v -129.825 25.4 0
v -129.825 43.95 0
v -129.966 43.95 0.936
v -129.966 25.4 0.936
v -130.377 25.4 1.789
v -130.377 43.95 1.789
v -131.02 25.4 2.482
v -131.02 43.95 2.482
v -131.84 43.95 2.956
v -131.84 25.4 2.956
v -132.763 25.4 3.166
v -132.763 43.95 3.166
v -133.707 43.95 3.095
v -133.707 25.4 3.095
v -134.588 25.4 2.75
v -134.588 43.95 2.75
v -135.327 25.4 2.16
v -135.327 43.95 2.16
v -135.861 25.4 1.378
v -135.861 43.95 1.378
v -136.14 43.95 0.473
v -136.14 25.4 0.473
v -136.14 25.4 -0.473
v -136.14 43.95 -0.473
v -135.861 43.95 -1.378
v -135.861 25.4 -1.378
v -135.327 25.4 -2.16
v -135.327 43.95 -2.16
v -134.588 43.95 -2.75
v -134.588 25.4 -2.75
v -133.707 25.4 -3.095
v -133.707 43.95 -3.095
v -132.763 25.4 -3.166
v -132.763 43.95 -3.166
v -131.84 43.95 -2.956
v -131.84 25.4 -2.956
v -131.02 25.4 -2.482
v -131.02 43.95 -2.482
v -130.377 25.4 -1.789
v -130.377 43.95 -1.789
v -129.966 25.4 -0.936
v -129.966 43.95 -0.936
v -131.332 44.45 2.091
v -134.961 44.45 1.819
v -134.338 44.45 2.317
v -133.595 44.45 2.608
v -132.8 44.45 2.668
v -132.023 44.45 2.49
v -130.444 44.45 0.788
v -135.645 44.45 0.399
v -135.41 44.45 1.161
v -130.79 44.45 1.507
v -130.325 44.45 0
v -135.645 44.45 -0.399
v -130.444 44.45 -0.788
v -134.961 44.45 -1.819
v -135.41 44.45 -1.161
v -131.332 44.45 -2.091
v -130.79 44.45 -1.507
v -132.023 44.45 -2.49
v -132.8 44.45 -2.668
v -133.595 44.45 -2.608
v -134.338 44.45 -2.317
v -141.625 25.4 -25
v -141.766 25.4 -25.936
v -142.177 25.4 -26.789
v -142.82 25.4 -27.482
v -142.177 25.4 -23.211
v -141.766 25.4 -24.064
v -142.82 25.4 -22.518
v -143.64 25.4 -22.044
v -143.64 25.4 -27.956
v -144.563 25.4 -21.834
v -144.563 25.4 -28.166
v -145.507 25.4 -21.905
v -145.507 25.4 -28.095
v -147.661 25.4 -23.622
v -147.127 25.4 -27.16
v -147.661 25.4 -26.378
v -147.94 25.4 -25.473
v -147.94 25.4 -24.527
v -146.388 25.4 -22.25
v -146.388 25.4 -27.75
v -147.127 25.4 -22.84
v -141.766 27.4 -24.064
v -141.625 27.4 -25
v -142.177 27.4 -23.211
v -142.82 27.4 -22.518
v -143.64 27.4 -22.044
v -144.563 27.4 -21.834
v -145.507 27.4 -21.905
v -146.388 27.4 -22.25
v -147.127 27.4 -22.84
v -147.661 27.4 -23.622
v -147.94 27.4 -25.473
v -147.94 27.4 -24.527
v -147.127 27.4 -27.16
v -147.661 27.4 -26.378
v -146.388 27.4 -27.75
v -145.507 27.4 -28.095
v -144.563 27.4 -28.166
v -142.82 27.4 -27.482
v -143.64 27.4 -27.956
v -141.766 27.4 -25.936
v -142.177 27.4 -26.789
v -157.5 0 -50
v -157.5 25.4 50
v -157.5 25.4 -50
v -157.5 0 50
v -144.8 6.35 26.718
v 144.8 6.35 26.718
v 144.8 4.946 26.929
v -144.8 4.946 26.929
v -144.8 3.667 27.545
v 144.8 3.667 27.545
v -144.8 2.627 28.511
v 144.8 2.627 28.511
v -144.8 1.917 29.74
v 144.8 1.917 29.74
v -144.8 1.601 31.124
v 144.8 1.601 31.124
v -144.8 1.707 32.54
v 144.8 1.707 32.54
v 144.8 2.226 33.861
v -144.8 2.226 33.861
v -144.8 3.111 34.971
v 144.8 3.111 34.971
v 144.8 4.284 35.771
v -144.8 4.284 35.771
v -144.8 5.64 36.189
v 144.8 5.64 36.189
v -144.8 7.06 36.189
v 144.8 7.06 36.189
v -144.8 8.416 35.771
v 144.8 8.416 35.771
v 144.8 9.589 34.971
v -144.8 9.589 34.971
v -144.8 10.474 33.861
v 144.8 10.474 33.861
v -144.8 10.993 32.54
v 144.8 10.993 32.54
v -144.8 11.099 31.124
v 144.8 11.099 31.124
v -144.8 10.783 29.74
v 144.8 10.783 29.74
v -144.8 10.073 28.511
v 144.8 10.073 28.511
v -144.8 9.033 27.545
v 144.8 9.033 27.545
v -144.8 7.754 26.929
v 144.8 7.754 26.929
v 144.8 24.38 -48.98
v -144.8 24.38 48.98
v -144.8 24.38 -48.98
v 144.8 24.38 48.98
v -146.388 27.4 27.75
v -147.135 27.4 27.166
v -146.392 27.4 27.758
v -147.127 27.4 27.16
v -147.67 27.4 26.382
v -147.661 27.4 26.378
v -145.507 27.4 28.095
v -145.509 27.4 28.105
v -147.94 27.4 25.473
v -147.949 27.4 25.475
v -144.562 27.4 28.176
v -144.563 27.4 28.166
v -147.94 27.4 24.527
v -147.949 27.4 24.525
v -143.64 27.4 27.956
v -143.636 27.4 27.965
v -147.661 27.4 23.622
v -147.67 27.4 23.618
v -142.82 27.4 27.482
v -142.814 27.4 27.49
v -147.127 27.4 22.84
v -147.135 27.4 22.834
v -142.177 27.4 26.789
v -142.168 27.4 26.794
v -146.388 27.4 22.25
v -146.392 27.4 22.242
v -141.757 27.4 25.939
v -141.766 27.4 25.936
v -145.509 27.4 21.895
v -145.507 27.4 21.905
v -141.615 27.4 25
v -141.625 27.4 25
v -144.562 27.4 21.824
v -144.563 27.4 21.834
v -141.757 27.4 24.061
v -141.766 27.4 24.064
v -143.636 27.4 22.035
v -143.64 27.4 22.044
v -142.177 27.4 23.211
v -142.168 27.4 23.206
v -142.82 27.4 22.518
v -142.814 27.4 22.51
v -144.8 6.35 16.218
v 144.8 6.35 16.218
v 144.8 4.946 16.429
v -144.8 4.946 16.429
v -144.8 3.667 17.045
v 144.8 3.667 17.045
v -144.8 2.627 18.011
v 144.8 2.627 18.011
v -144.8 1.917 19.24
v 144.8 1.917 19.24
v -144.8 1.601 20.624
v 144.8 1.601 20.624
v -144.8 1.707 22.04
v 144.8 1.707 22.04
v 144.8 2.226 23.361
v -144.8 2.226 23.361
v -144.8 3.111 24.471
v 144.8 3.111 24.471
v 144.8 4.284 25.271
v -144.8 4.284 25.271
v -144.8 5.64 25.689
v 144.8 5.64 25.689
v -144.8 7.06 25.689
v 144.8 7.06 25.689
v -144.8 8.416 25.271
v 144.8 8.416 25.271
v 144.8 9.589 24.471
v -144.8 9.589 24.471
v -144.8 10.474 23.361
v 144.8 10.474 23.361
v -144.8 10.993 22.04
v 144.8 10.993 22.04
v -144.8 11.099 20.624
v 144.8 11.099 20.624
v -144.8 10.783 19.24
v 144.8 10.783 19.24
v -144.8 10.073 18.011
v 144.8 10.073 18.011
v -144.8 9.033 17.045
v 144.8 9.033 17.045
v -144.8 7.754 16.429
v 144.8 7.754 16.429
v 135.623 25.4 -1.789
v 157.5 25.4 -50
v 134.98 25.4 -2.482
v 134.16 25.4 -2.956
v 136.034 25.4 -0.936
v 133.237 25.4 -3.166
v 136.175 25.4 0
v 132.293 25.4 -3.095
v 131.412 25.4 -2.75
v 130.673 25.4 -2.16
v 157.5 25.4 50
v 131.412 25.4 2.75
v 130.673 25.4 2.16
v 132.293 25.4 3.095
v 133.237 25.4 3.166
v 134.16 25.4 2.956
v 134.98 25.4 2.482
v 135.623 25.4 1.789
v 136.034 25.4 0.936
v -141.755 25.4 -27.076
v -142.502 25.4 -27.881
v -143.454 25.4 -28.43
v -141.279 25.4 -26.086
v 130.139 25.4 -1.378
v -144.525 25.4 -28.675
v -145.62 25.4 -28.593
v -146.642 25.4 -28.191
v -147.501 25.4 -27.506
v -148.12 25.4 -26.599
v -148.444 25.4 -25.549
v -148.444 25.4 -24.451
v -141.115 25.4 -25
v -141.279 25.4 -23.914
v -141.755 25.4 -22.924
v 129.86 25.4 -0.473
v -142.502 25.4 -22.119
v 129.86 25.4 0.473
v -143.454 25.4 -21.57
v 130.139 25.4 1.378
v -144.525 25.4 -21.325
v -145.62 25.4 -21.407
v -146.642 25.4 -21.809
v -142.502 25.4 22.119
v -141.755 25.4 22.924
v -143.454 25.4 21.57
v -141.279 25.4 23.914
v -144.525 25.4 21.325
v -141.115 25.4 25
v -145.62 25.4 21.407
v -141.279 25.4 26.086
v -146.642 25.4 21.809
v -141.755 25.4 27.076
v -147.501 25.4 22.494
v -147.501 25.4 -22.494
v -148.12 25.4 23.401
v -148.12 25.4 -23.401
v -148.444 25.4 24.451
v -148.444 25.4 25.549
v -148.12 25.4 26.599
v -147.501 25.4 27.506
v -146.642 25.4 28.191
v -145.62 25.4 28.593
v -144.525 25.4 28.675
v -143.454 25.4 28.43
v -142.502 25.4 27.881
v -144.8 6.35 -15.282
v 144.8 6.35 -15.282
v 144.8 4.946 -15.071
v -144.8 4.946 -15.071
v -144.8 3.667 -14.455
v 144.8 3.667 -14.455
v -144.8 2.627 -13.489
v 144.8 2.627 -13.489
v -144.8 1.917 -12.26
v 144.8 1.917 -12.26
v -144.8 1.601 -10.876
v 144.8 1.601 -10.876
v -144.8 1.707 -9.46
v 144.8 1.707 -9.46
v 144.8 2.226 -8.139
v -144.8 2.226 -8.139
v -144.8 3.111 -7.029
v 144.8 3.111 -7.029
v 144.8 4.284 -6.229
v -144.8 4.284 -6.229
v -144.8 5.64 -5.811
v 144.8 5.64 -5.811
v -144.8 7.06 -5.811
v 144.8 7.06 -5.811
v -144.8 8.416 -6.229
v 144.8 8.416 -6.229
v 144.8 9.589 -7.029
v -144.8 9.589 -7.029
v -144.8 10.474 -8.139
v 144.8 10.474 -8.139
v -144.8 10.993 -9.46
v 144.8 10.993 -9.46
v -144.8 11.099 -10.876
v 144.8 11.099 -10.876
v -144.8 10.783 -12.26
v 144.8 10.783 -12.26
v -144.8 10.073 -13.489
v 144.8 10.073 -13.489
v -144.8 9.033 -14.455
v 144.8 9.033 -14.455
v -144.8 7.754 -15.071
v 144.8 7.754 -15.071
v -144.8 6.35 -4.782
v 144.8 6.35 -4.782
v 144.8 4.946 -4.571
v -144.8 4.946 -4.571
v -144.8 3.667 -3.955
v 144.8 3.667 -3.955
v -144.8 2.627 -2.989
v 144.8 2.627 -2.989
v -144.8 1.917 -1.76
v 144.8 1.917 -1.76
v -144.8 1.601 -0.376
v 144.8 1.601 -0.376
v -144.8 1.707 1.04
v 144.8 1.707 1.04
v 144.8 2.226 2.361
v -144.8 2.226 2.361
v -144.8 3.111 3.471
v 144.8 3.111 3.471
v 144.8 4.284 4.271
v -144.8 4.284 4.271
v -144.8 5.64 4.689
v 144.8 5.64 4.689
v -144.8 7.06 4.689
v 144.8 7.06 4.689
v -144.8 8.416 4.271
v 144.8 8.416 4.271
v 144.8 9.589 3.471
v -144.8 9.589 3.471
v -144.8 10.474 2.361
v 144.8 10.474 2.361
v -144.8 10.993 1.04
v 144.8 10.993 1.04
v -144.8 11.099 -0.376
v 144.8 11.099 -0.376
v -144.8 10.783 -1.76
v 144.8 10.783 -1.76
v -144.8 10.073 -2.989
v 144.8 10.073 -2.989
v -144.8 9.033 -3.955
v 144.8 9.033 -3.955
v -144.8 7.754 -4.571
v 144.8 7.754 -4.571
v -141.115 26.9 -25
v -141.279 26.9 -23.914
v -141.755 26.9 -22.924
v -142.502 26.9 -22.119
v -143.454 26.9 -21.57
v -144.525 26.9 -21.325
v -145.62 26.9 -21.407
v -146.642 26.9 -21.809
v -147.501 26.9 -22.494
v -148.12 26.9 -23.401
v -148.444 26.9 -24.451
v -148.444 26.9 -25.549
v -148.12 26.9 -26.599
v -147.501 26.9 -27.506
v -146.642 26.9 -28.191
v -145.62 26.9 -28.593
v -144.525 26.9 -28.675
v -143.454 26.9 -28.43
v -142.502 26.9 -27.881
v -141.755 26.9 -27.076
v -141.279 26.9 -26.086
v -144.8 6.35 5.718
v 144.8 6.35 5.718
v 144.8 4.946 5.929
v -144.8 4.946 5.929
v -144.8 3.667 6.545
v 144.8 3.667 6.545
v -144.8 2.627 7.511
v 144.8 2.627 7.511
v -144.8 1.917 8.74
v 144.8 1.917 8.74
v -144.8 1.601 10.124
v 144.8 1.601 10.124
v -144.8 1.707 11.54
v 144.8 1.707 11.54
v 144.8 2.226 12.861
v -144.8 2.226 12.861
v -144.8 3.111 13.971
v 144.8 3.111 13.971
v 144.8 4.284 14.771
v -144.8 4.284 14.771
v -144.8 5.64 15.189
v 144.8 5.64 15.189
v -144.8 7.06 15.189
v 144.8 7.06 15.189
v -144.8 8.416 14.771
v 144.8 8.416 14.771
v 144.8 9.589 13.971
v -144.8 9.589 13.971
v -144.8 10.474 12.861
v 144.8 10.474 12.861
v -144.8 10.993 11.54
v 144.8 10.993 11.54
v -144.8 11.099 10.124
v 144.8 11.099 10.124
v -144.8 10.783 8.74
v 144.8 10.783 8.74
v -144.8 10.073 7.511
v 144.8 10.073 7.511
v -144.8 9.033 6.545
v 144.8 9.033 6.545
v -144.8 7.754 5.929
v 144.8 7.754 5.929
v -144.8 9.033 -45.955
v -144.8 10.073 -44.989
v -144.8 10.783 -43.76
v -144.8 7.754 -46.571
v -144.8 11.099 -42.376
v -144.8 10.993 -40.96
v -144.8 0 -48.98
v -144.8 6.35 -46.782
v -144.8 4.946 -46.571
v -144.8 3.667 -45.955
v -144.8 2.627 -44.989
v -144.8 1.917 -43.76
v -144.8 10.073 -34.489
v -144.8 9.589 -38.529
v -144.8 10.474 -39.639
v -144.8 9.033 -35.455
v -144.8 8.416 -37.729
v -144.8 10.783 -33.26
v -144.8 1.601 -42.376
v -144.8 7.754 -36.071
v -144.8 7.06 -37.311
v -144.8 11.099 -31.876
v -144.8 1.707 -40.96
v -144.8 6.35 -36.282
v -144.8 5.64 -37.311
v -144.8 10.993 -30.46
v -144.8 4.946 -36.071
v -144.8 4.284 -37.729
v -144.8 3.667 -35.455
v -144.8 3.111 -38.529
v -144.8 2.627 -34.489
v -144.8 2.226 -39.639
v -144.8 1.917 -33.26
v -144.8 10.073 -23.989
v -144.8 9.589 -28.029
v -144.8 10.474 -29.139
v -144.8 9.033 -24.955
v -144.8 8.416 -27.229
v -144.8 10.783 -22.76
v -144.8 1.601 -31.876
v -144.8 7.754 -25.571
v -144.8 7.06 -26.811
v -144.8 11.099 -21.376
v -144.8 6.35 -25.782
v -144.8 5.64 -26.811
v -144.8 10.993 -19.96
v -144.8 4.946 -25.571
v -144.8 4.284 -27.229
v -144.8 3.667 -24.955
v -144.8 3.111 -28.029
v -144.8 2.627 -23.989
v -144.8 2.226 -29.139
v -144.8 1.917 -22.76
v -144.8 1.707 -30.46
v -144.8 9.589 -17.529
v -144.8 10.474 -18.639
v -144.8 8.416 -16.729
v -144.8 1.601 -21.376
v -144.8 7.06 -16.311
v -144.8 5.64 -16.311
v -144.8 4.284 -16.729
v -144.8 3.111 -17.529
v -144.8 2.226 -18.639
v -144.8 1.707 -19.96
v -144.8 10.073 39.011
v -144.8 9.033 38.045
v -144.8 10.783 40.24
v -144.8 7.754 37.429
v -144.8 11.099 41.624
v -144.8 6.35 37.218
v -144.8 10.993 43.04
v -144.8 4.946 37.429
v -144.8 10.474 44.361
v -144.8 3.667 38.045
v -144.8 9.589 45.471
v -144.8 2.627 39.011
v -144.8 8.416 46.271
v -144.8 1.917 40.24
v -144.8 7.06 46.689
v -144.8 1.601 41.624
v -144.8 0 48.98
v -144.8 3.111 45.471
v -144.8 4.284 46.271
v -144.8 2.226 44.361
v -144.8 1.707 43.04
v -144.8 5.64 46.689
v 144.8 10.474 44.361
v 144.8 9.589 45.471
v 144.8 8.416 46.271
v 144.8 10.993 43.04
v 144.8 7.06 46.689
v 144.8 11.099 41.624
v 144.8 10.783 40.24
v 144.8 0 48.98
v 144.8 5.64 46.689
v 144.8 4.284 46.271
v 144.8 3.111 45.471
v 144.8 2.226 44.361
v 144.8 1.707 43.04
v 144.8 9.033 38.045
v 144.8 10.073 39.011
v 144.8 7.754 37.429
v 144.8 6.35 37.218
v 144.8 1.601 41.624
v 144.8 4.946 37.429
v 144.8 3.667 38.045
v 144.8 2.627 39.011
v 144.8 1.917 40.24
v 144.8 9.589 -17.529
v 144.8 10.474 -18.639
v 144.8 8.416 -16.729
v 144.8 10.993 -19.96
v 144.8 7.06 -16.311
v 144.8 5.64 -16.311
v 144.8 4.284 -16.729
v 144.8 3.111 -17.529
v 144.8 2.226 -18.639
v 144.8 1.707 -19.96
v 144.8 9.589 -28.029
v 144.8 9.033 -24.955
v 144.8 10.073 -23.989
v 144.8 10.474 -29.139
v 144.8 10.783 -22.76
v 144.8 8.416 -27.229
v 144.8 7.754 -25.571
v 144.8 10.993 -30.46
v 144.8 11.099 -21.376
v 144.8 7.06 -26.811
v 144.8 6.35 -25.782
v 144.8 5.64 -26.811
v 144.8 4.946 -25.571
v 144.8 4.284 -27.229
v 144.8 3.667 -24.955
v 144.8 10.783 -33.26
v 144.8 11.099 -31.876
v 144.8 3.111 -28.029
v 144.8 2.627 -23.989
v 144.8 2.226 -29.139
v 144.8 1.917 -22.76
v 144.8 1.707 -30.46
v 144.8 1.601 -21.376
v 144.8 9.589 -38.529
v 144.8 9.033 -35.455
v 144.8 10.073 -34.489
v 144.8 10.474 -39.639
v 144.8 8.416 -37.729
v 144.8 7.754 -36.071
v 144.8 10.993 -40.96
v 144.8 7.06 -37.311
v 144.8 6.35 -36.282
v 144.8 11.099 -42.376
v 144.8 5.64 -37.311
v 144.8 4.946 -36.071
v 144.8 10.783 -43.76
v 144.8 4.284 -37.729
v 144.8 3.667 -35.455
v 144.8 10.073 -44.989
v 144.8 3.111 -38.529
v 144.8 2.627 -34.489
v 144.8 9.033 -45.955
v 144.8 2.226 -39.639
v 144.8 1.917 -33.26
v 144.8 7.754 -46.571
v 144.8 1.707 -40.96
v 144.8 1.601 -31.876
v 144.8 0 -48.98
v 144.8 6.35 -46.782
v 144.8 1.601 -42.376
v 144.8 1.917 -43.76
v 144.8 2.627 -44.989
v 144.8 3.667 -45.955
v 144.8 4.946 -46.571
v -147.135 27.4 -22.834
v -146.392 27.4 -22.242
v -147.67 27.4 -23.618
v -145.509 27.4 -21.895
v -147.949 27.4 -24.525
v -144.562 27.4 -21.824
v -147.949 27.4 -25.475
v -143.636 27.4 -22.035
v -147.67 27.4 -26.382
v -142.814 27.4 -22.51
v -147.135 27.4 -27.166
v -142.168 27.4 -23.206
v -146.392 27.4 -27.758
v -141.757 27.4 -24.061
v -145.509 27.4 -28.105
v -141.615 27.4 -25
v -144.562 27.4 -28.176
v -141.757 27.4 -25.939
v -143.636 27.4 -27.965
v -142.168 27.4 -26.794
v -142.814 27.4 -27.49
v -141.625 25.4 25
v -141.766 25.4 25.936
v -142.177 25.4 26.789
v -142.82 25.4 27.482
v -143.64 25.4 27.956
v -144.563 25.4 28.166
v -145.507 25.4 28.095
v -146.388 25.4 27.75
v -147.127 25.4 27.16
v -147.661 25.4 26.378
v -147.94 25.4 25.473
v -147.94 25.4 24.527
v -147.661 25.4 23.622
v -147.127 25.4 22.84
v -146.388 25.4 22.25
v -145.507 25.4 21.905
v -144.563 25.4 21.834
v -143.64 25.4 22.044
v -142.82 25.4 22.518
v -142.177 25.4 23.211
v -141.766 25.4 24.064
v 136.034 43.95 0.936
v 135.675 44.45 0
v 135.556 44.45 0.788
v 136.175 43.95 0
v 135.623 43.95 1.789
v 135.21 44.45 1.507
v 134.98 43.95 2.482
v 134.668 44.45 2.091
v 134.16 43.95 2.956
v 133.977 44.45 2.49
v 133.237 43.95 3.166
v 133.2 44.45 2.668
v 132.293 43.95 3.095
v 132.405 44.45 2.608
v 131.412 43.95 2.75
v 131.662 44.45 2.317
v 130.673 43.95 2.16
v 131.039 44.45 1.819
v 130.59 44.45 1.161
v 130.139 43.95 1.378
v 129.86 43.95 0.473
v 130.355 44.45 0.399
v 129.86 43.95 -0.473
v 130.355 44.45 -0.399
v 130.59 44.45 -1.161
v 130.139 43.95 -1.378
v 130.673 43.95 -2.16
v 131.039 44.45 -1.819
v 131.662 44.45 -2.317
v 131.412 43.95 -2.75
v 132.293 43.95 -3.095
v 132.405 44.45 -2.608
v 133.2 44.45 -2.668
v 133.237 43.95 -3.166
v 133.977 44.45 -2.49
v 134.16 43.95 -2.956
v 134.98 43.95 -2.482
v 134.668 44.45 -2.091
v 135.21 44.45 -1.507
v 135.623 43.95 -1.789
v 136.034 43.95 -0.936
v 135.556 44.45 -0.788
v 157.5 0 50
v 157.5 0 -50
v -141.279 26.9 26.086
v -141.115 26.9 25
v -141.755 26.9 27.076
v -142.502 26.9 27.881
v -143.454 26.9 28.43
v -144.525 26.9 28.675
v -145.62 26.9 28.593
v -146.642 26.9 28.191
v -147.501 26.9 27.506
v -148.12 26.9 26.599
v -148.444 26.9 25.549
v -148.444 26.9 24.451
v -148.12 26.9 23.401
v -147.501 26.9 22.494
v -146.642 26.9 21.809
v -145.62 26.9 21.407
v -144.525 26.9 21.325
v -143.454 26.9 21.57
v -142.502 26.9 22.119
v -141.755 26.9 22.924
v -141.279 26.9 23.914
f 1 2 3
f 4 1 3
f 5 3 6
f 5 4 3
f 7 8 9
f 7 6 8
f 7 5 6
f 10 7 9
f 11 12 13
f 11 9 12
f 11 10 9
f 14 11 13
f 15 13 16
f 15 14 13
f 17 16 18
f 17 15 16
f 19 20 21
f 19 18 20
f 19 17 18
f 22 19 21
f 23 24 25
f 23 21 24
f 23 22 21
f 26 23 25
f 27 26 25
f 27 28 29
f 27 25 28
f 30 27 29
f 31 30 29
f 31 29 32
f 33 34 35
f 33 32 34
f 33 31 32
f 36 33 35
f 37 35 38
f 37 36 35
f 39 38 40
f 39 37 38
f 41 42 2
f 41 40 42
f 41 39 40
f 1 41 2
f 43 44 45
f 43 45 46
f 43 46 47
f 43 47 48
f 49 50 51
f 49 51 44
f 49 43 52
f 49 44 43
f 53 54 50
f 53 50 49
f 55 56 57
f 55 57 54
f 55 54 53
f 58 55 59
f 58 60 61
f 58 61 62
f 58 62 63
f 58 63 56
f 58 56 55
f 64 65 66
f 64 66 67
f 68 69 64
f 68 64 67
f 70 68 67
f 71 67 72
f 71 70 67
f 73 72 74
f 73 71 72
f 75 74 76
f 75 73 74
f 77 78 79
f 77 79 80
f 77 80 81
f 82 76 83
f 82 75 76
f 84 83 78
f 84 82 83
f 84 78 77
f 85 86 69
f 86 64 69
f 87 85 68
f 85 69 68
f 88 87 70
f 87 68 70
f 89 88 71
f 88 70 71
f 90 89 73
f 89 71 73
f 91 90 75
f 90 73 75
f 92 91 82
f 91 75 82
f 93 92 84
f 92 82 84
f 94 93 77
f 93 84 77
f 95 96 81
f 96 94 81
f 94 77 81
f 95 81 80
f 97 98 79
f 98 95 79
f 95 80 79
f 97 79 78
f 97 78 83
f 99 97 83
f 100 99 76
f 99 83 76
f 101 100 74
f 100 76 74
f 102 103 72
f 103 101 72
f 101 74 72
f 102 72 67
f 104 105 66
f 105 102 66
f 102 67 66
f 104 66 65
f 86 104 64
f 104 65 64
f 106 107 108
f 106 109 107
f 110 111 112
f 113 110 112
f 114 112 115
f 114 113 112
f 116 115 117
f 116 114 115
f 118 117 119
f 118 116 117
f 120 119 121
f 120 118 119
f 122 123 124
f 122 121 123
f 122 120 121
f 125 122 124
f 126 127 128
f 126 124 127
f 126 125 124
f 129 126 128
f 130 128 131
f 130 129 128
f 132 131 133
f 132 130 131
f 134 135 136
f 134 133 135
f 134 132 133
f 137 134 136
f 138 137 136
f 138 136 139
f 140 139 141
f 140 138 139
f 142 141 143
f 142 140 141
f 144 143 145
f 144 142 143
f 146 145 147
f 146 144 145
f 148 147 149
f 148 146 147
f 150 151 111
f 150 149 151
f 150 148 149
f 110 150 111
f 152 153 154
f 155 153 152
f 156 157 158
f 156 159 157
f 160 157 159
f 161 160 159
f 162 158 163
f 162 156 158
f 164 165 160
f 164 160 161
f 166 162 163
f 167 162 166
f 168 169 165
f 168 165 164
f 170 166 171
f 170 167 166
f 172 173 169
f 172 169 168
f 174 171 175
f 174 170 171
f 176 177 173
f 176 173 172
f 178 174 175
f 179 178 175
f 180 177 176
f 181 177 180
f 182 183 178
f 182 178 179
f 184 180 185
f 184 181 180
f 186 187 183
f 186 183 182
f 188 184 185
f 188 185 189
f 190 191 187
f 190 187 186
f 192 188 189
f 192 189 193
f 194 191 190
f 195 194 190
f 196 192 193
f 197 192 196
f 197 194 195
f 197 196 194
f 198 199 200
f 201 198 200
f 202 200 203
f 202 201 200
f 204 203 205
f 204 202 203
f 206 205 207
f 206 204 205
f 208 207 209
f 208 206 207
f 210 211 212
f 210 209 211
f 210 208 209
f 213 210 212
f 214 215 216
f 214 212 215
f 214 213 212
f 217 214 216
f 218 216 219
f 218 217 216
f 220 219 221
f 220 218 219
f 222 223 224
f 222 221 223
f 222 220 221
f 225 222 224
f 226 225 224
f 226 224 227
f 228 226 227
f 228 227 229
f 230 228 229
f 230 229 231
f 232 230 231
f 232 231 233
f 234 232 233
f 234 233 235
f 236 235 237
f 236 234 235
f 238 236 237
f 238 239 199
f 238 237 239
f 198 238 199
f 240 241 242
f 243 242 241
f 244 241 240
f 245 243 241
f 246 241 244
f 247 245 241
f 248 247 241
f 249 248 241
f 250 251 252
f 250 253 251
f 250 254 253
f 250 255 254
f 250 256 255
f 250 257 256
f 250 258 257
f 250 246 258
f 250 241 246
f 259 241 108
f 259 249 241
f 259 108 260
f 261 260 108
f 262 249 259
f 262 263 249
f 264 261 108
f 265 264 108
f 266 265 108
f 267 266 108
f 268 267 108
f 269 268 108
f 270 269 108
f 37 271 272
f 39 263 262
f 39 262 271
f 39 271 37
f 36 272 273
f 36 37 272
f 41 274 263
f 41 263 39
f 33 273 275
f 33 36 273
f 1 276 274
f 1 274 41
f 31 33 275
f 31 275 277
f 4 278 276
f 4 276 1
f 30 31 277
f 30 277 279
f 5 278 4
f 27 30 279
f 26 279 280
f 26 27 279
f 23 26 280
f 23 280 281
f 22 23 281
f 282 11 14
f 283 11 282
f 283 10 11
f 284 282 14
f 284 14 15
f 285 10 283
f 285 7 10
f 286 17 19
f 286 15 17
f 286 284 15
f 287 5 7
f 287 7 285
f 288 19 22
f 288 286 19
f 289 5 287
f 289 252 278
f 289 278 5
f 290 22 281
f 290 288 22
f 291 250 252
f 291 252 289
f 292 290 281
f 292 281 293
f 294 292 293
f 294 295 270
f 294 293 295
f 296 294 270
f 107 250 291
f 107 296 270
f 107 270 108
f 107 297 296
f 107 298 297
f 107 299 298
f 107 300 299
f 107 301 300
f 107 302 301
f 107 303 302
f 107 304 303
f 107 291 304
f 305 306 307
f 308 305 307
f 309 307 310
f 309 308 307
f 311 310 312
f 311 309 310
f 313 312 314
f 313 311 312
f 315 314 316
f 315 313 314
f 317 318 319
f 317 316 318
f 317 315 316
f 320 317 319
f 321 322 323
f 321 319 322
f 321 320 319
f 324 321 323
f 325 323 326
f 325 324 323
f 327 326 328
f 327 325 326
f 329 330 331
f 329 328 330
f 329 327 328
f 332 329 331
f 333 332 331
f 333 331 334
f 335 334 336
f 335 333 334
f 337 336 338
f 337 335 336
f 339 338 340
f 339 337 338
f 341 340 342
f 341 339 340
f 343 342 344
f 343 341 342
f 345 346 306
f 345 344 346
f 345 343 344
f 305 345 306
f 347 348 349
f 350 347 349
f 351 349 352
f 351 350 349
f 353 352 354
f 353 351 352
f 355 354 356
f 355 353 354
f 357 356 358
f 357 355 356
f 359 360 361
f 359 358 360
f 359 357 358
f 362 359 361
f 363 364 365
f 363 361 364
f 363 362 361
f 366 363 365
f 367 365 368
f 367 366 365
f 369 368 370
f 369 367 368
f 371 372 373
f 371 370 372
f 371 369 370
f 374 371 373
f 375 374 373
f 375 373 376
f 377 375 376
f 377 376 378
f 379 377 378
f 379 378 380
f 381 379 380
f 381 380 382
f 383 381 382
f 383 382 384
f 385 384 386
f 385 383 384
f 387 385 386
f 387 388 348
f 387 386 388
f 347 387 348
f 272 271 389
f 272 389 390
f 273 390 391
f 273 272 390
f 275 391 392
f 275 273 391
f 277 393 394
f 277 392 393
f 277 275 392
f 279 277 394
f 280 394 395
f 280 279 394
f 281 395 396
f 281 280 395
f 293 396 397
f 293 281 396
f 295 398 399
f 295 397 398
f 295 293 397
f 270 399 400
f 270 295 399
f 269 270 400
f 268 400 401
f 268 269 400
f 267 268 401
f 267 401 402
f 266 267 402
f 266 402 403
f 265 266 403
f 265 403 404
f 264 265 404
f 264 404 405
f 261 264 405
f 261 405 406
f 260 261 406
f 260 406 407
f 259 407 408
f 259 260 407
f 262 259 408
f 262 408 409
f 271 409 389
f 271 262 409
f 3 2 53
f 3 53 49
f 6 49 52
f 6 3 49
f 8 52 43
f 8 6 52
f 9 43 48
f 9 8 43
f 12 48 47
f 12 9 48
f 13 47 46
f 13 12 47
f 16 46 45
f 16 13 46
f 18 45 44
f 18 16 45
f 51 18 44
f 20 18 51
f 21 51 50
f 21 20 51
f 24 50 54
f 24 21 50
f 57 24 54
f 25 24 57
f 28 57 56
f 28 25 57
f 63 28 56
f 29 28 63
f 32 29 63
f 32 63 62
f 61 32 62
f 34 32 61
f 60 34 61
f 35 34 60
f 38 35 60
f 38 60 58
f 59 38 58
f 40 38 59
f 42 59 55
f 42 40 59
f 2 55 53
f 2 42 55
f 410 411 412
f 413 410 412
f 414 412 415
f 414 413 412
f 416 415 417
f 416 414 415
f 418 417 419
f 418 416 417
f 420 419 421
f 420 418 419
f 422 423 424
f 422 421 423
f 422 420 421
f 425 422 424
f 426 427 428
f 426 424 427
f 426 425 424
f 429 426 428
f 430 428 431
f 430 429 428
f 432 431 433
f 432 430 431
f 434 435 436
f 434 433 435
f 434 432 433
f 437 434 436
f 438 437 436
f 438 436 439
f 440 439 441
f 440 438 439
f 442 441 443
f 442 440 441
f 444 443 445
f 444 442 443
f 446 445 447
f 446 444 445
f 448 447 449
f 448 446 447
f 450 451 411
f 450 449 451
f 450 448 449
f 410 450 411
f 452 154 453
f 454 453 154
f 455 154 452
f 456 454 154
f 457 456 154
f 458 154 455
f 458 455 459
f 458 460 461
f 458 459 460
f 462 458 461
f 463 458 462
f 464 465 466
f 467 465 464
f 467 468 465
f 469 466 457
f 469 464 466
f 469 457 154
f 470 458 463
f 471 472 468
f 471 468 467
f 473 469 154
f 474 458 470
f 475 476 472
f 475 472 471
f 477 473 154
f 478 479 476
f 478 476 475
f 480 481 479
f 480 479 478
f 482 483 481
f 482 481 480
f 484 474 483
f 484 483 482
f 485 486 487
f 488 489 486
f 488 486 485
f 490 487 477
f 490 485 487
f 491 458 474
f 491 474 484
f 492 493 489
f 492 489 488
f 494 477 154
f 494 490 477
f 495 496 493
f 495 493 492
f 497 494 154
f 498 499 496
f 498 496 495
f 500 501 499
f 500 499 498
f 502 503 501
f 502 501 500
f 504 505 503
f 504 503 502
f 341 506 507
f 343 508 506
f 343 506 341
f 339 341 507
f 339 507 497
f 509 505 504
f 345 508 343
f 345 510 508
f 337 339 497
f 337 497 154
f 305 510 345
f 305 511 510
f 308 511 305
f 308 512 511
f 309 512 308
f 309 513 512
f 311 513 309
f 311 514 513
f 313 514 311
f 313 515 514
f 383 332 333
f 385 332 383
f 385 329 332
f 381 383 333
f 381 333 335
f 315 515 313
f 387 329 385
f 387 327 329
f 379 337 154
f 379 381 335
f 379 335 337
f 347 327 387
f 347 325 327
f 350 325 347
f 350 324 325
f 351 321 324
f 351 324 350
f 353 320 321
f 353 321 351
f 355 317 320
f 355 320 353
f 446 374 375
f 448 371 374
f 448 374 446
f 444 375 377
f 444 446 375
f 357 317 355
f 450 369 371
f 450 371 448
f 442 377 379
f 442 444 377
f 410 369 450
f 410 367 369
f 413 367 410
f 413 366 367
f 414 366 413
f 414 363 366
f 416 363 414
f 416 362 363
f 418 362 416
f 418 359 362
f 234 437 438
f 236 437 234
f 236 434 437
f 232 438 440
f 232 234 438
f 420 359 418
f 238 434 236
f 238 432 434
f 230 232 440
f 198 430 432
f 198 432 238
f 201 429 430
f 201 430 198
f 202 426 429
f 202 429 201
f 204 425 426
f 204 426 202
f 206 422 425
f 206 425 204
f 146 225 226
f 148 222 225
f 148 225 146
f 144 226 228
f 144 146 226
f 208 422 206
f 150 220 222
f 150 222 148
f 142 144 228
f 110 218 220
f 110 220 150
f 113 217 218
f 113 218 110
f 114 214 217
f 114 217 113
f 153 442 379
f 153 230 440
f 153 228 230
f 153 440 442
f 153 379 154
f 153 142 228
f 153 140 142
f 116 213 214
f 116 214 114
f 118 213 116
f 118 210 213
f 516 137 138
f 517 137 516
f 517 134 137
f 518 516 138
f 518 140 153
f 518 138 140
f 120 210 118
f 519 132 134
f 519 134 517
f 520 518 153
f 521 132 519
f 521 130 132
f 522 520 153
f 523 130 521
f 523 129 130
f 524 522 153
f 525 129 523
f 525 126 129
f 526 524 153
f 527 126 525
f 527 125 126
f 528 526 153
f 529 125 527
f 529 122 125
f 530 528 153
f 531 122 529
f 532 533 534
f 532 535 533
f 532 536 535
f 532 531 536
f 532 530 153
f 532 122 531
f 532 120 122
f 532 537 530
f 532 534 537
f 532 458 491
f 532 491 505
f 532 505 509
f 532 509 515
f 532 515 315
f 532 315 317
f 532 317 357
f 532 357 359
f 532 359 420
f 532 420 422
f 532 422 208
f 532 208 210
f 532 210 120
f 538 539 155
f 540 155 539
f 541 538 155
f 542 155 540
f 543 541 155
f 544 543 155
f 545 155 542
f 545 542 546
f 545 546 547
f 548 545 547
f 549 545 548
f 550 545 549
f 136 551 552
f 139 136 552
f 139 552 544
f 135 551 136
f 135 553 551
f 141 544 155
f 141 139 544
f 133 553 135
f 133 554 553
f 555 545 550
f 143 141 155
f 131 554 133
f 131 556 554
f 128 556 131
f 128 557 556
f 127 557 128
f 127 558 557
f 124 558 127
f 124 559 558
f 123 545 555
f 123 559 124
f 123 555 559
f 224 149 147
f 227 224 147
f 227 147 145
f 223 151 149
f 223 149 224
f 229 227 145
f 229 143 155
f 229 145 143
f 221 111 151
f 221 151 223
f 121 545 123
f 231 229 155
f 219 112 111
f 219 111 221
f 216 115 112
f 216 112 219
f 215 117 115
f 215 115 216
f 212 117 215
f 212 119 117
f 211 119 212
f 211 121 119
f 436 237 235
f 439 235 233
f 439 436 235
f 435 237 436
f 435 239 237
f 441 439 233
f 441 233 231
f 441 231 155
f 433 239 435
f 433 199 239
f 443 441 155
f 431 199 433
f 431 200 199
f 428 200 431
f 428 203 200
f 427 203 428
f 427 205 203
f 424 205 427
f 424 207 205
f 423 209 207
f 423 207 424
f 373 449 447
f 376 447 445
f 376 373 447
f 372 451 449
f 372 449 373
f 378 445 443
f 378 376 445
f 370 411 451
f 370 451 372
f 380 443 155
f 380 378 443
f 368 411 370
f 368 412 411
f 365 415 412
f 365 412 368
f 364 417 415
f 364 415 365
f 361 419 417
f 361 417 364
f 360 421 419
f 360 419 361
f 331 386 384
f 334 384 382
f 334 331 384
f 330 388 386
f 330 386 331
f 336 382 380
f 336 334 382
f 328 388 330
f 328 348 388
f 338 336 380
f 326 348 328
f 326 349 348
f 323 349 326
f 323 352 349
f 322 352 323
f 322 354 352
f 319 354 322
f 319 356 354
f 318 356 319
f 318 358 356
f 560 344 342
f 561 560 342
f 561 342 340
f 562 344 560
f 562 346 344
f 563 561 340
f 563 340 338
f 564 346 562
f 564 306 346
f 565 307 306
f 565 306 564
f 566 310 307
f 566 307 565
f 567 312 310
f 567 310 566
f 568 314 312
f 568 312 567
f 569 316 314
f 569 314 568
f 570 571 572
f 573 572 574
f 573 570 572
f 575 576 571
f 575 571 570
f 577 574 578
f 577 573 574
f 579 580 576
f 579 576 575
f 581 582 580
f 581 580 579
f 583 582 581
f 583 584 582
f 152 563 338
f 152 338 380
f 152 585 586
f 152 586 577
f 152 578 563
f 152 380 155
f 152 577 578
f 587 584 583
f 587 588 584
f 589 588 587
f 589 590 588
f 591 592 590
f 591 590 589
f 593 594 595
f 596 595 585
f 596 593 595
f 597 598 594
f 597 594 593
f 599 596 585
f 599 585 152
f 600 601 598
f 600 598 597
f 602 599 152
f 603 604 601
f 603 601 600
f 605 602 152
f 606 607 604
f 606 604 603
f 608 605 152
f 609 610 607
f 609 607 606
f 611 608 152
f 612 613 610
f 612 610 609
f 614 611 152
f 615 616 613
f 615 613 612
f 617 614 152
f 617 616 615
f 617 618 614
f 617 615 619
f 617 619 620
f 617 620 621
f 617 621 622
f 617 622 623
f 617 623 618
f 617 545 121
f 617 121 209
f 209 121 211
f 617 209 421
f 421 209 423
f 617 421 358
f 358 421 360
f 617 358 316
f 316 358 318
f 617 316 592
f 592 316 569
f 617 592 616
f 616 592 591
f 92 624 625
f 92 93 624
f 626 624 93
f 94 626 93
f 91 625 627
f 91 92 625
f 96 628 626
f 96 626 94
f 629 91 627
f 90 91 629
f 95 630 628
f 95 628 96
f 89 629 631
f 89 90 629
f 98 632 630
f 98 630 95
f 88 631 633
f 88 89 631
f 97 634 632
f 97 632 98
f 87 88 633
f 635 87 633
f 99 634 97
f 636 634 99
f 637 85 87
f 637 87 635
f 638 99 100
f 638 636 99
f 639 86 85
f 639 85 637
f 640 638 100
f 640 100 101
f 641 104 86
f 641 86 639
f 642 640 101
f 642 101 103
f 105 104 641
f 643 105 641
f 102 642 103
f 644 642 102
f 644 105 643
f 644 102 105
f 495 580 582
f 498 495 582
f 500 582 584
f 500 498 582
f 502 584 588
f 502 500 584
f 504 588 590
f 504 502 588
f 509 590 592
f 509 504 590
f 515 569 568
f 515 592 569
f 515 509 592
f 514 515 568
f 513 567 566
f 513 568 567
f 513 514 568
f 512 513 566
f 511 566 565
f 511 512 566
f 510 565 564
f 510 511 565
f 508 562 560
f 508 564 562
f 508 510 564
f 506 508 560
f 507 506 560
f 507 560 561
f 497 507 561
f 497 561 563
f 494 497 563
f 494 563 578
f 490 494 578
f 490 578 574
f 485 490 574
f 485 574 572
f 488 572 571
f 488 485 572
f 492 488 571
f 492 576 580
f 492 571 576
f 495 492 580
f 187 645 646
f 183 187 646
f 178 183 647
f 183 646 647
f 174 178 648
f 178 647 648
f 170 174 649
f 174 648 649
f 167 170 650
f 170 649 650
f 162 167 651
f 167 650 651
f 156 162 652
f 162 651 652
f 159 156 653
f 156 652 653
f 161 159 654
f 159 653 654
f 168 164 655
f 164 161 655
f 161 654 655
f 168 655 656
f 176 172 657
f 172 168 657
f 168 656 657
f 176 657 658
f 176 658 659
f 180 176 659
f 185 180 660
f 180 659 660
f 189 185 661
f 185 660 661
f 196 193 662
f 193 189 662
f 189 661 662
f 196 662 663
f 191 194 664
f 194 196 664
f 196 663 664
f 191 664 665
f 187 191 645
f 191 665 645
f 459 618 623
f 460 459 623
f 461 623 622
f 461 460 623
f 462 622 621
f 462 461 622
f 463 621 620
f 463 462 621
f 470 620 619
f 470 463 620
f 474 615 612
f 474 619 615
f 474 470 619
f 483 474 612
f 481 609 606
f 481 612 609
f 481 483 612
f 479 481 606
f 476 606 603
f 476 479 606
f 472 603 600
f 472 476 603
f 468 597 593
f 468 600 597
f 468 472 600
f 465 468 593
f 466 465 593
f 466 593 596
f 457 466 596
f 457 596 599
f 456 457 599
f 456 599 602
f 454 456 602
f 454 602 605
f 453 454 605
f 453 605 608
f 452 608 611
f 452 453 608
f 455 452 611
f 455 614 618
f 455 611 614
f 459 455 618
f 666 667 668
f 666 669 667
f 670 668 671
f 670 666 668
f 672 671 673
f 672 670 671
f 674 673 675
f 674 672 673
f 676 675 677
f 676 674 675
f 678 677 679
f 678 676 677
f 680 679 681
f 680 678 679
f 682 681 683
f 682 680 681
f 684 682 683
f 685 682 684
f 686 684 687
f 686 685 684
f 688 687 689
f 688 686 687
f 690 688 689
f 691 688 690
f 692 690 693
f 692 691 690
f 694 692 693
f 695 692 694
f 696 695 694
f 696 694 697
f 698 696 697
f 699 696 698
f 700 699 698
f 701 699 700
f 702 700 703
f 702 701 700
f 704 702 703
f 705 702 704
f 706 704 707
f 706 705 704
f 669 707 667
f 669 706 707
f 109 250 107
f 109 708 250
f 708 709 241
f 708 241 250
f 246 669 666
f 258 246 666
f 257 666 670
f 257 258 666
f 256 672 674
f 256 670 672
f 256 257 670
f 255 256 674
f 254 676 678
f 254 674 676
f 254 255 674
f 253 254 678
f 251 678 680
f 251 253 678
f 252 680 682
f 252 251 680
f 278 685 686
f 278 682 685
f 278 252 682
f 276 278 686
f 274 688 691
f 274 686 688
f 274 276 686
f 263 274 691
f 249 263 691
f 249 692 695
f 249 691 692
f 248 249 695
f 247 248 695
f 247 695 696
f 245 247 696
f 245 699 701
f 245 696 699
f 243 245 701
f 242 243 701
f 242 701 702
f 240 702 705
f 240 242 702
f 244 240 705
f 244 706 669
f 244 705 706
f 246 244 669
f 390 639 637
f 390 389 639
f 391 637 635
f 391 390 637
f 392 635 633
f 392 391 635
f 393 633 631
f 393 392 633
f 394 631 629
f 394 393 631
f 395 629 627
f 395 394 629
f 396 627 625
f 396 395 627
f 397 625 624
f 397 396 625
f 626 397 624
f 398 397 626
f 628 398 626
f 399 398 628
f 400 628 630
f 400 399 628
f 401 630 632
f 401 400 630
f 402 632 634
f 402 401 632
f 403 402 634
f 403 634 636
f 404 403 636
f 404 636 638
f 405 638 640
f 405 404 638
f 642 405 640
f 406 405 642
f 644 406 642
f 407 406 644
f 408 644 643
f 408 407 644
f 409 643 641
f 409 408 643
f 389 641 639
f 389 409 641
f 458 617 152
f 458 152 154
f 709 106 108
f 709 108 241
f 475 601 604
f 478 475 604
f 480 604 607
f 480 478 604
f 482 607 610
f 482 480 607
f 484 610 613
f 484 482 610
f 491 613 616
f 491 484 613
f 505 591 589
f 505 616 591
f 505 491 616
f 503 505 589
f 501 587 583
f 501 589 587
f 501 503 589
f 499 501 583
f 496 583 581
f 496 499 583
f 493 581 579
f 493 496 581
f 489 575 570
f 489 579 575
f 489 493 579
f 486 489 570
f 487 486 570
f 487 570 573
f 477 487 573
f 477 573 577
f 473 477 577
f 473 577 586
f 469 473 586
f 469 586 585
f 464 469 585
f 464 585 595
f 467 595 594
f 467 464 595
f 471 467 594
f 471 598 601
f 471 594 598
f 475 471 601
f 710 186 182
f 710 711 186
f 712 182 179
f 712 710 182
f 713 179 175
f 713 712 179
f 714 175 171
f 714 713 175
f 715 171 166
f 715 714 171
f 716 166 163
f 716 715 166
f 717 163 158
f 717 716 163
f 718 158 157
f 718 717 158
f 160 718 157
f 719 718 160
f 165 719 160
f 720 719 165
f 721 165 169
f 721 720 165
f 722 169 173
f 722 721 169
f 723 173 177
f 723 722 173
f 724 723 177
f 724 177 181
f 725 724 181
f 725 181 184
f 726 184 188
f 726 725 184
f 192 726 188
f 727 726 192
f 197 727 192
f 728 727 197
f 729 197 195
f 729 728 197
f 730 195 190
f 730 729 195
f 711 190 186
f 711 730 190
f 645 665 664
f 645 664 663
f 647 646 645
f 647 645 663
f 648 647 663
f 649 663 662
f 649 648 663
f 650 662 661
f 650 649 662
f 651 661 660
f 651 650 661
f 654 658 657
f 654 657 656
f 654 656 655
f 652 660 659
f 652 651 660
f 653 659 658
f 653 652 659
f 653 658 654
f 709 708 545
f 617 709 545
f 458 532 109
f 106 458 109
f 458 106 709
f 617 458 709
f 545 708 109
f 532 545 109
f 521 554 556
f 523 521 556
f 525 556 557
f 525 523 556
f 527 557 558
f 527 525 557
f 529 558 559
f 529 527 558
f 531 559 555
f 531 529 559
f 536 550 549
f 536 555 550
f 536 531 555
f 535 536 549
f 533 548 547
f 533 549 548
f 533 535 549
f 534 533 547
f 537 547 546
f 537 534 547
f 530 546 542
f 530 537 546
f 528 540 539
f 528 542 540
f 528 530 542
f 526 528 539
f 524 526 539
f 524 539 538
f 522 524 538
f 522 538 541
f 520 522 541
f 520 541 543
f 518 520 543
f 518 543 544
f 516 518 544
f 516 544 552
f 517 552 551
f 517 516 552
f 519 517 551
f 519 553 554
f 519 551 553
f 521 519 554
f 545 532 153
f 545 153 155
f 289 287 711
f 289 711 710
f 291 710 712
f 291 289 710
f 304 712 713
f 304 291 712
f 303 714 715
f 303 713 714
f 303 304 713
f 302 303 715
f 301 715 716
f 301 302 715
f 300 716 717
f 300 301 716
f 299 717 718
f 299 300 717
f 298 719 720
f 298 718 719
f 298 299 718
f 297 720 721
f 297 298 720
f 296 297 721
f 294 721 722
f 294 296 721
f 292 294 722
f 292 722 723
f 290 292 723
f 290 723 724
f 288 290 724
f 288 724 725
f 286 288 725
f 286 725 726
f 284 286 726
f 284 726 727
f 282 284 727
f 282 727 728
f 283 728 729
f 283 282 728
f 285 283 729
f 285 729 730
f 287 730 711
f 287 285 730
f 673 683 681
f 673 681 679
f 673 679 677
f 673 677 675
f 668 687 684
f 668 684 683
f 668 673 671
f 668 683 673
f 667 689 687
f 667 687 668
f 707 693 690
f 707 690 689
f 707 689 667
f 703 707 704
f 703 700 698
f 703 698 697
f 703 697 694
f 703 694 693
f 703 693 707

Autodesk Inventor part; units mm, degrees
ref_plane "YZ Plane" through (0, 0, 0) normal (1, 0, 0) x (0, 1, 0)
ref_plane "XZ Plane" through (0, 0, 0) normal (0, 1, 0) x (-1, 0, 0)
ref_plane "XY Plane" through (0, 0, 0) normal (0, 0, 1) x (1, 0, 0)
sketch "Boceto1" plane through (0, 0, 0) normal (0, 1, 0) x (-1, 0, 0)
  line L0 (-157.5, 50) -> (157.5, 50)
  line L1 (157.5, 50) -> (157.5, -50)
  line L2 (157.5, -50) -> (-157.5, -50)
  line L3 (-157.5, -50) -> (-157.5, 50)
  line L4 (-157.5, 50) -> (157.5, -50) construction
  line L5 (157.5, 50) -> (-157.5, -50) construction
  point P0 (0, 0)
  dimension "d0" = 315
  dimension "d1" = 100
extrude "Extrusión1" add sketch "Boceto1" along normal blind 25.4
sketch "Boceto2" plane through (0, 0, 0) normal (0, -1, 0) x (1, 0, 0)
  line L0 (-144.8, 48.98) -> (144.8, 48.98)
  line L1 (144.8, -48.98) -> (-144.8, -48.98)
  line L2 (-144.8, -48.98) -> (-144.8, 48.98)
  line L3 (144.8, 48.98) -> (144.8, -48.98)
  line L4 (-157.5, -50) -> (-157.5, 50) projected
  line L5 (-157.5, 50) -> (157.5, 50) projected
  line L6 (157.5, 50) -> (157.5, -50) projected
  dimension "d8" = 12.7
  dimension "d9" = 1.02
  dimension "d52" = 12.7
extrude "Extrusión2" cut sketch "Boceto2" against normal blind 24.38
sketch "Boceto4" plane through (0, 25.4, 0) normal (0, 1, 0) x (1, 0, 0)
  line L0 (-157.5, 50) -> (-108.5, 50) construction
  line L1 (-108.5, 50) -> (-108.5, -50) construction
  line L2 (-157.5, -50) -> (157.5, -50) construction
  line L3 (-157.5, -50) -> (-108.5, 50) construction
  line L4 (-157.5, 50) -> (-108.5, -50) construction
  line L5 (157.5, 50) -> (-157.5, 50) construction
  line L6 (157.5, 50) -> (108.5, 50) construction
  line L7 (108.5, 50) -> (108.5, -50) construction
  line L8 (108.5, -50) -> (157.5, 50) construction
  line L9 (108.5, 50) -> (157.5, -50) construction
  circle A0 centre (-133, 0) radius 3.175
  circle A1 centre (133, 0) radius 3.175
  point P0 (0, 0)
  dimension "d24" = 49
  dimension "d25" = 49
  dimension "d26" = 6.35
  dimension "d27" = 6.35
extrude "Extrusión4" add sketch "Boceto4" along normal blind 19.05
thread "Rosca1" size "1/4-20 UNC" class "1A" standard "ANSI Unified Screw Threads" full length
thread "Rosca2" size "M7x1" class "6g" standard "ANSI Metric M Profile" full length
chamfer "Chaflán1" distance 0.5 angle 45 1 edges at (-136.175, 44.45, 0)
chamfer "Chaflán2" distance 0.5 angle 45 1 edges at (129.825, 44.45, 0)
sketch "Boceto6" plane through (-144.8, 0, 48.98) normal (1, 0, 0) x (0, 0, -1)
  circle A0 centre (7, 6.35) radius 4.7625
  line L0 (0, 0) -> (0, 24.38) projected
  line L1 (97.96, 0) -> (0, 0) projected
  circle A1 centre (17.5, 6.35) radius 4.7625
  circle A2 centre (28, 6.35) radius 4.7625
  circle A3 centre (38.5, 6.35) radius 4.7625
  circle A4 centre (49, 6.35) radius 4.7625
  circle A5 centre (59.5, 6.35) radius 4.7625
  circle A6 centre (70, 6.35) radius 4.7625
  circle A7 centre (80.5, 6.35) radius 4.7625
  circle A8 centre (91, 6.35) radius 4.7625
  point P0 (48.98, 0)
  dimension "d53" = 9.525
  dimension "d54" = 7
  dimension "d55" = 6.35
  dimension "d58" = 10.5
extrude "Extrusión6" add sketch "Boceto6" along normal up to surface (289.6 mm away)
sketch "Boceto7" plane through (0, 25.4, 0) normal (0, 1, 0) x (1, 0, 0)
  line L0 (-157.5, 50) -> (-157.5, -50) construction
  line L1 (-157.5, 0) -> (-144.8, 0) construction
  line L2 (-144.8, 0) -> (-144.8, 25) construction
  line L3 (-144.8, 48.98) -> (-144.8, -48.98) construction
  line L4 (-144.8, 0) -> (-144.8, -25) construction
  circle A0 centre (-144.8, -25) radius 3.175
  circle A1 centre (-144.8, 25) radius 3.175
  circle A2 centre (-144.8, -25) radius 3.685
  circle A3 centre (-144.8, 25) radius 3.685
  point P0 (0, 0)
  dimension "d67" = 12.7
  dimension "d68" = 25
  dimension "d69" = 25
  dimension "d70" = 6.35
  dimension "d71" = 6.35
  dimension "d72" = 7.37
  dimension "d73" = 7.37
extrude "Extrusión7" add sketch "Boceto7" along normal blind 2
chamfer "Chaflán4" distance 0.5 angle 45 2 edges at (-148.485, 27.4, 25) (-148.485, 27.4, -25)
sketch "Boceto8" plane through (-144.8, 25.4, -25) normal (0, 1, 0) x (1, 0, 0)
  circle A0 centre (0, 0) radius 3.175 projected
sketch "Boceto9" plane through (-144.8, 25.4, 25) normal (0, 1, 0) x (1, 0, 0)
  circle A0 centre (0, 0) radius 3.175 projected
properties part number "resistencia_cuarzo_550W"
